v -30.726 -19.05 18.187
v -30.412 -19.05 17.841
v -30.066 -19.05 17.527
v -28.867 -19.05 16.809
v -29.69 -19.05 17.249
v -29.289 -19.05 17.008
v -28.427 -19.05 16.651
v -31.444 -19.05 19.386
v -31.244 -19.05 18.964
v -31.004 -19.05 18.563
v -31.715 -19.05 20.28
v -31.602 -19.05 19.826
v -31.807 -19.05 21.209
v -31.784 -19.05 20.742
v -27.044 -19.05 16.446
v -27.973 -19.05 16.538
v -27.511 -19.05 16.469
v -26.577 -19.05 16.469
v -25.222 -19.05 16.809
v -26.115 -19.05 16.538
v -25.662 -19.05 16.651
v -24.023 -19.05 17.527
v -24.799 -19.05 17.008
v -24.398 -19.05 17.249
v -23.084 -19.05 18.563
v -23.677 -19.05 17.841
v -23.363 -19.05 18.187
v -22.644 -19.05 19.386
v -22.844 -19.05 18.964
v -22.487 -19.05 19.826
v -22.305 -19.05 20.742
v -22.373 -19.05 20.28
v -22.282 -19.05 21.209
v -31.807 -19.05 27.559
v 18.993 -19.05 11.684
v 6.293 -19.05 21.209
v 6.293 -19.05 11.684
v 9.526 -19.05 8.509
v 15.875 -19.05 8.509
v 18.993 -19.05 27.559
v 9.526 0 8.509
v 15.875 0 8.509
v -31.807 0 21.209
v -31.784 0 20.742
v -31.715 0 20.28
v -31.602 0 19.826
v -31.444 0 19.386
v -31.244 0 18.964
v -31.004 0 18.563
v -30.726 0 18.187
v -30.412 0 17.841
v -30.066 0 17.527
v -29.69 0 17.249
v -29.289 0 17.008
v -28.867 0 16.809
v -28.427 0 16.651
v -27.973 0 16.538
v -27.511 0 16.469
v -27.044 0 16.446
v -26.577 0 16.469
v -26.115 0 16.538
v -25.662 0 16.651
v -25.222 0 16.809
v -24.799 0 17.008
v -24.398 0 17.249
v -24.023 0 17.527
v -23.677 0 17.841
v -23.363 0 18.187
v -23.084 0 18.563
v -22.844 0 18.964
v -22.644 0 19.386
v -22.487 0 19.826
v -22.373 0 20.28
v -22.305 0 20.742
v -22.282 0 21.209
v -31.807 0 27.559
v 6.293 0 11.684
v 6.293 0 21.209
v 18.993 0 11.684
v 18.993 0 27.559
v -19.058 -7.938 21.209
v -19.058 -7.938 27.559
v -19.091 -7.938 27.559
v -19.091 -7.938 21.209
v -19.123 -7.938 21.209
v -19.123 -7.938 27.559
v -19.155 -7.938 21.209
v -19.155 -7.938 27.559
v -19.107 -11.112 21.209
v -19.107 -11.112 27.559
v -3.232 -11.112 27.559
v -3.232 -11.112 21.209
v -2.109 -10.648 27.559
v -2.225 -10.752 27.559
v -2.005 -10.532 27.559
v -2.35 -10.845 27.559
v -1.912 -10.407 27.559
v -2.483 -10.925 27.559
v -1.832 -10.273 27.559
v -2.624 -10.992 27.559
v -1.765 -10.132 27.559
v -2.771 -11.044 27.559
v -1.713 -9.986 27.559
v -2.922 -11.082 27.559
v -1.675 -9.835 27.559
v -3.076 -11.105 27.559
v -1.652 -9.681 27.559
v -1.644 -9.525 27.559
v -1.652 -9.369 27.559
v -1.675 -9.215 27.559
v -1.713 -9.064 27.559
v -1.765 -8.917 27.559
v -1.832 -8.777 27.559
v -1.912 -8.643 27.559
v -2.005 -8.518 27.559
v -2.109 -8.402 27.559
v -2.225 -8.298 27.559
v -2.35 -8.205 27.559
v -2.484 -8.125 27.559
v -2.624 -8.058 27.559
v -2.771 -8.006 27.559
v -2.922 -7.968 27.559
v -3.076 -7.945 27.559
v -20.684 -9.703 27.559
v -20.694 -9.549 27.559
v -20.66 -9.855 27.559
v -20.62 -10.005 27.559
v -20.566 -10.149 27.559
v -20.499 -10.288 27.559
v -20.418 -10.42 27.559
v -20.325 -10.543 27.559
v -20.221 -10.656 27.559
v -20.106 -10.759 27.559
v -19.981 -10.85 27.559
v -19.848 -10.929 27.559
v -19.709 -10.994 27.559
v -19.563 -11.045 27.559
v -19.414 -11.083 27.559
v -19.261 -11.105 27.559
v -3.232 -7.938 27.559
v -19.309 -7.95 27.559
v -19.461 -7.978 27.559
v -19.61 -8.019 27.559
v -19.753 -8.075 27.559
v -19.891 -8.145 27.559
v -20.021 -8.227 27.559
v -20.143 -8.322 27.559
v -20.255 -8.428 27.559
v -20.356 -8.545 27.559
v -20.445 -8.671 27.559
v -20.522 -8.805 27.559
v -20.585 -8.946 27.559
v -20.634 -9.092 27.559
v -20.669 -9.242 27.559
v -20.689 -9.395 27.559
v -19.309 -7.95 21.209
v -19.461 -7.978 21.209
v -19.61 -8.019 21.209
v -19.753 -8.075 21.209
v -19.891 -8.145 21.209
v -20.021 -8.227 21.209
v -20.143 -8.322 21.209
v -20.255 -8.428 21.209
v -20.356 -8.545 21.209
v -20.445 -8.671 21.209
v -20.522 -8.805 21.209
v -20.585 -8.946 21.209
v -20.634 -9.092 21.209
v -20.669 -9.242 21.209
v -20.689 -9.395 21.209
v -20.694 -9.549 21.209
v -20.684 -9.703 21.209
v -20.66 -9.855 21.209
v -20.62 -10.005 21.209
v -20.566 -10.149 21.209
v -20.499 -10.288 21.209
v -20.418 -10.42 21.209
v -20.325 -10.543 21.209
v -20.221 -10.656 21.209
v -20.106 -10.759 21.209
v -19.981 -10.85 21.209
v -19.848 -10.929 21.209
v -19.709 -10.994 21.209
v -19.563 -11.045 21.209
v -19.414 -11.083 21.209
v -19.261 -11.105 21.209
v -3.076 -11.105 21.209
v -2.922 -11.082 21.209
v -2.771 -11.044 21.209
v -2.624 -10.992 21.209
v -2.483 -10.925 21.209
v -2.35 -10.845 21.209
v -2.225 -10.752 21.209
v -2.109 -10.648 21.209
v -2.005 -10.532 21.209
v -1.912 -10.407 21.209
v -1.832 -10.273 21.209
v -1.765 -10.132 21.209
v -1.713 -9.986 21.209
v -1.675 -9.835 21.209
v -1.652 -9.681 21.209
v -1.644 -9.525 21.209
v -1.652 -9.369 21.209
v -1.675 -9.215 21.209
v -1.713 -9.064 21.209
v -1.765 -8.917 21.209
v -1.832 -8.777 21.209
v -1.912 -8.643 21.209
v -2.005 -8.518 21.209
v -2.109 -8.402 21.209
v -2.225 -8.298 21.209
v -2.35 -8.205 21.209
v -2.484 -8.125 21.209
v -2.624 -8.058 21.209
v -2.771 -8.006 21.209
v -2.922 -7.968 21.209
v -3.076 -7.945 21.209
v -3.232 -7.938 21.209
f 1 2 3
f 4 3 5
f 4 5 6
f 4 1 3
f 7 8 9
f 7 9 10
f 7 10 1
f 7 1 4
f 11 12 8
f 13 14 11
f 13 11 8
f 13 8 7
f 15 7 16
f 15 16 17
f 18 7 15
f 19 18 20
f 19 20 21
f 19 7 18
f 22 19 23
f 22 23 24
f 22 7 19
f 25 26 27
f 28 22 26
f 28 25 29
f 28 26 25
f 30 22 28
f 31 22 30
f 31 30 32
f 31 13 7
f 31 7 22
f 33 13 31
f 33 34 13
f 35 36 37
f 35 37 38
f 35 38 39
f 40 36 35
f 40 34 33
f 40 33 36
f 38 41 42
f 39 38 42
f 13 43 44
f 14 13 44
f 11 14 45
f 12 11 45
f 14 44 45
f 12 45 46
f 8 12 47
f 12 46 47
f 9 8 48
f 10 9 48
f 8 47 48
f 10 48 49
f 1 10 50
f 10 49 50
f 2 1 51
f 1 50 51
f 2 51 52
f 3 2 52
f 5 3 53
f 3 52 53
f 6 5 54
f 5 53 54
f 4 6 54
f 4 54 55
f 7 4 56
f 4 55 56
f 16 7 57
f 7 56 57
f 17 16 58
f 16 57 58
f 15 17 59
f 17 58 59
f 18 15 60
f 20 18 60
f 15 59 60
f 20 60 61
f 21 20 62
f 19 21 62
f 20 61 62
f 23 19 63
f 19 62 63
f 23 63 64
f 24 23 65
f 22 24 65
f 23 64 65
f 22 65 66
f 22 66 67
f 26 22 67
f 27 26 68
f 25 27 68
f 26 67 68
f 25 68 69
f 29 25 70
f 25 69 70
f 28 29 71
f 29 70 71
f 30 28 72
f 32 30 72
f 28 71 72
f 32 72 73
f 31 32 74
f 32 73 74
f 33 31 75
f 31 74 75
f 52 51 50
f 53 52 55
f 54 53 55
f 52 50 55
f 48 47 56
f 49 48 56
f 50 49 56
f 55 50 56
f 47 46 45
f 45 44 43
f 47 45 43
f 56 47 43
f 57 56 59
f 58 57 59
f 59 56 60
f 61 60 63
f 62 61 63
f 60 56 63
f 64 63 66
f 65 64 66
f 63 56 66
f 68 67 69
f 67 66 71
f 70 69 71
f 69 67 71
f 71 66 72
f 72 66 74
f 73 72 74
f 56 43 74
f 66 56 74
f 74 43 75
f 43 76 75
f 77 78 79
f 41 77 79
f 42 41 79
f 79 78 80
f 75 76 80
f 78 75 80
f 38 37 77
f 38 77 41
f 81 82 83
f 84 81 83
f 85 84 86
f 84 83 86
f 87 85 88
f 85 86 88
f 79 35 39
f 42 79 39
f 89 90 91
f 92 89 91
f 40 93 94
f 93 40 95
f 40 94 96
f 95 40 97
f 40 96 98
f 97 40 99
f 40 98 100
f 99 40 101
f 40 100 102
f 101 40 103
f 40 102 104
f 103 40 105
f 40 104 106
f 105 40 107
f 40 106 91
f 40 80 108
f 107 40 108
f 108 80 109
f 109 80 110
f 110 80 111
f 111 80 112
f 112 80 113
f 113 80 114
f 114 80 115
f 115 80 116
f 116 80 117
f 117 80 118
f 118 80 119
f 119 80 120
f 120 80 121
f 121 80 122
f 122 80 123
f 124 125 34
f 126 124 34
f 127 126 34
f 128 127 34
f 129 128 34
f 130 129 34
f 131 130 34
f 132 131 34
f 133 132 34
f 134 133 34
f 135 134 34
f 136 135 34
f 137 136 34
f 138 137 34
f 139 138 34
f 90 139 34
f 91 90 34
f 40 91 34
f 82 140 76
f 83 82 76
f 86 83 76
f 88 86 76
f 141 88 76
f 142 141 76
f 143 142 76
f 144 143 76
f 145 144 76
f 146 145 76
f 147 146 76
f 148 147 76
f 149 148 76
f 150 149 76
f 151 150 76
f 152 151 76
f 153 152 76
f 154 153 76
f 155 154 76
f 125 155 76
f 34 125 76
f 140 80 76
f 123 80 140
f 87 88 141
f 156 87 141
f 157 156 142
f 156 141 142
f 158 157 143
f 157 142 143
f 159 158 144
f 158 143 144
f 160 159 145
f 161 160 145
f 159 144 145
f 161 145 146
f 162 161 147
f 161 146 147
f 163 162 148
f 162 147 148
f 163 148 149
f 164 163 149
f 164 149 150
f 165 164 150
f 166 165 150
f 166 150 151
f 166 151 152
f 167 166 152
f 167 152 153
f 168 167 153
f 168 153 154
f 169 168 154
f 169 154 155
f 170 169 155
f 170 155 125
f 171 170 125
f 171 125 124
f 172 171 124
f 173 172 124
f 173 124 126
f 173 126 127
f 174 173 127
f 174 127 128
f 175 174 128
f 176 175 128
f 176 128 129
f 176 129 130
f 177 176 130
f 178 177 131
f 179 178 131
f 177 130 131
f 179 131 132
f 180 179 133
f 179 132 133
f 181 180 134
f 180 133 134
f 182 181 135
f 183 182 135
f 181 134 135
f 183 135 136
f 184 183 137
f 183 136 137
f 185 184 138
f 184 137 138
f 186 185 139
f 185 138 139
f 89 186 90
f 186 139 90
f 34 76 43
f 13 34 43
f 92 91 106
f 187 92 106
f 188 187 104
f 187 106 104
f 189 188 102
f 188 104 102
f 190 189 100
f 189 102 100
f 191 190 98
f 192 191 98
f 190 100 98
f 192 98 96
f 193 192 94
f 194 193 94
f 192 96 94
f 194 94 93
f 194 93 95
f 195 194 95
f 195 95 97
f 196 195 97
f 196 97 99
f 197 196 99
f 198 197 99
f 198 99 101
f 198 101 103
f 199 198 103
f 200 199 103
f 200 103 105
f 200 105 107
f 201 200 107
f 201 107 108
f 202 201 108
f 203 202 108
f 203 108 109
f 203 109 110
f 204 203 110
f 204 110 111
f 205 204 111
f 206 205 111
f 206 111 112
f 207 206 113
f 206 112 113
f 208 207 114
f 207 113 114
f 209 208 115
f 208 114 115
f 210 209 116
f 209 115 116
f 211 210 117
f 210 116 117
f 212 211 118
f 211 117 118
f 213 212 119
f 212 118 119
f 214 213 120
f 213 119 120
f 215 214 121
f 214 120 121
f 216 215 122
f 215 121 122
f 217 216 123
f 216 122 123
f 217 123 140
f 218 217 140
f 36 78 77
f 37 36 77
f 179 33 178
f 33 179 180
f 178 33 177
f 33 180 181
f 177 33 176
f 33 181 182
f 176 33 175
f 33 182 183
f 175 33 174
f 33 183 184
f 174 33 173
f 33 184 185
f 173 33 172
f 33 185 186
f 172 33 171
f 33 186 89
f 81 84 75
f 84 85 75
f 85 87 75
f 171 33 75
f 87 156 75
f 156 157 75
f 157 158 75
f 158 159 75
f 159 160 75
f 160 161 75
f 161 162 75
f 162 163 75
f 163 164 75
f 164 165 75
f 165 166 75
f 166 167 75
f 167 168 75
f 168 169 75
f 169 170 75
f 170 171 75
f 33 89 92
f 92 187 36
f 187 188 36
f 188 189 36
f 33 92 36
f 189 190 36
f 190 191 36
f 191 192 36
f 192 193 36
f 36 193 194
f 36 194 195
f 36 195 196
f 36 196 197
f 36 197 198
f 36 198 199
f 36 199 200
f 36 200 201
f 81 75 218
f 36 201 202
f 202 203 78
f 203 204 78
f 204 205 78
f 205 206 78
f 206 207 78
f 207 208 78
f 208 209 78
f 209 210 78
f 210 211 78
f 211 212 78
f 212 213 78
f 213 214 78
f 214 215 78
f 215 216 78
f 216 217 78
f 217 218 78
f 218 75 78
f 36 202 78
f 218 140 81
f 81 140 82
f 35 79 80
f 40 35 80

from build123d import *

# Parameters (mm, degrees)
F1_DEPTH = 19.05
F3_DEPTH = 31.17521
F5_DEPTH = 22.95972
F7_DEPTH = 30.07307


with BuildPart() as f1:
    # F0 (on Front) → F1 (new body)
    with BuildSketch(Plane.XZ):
        with BuildLine():
            Line((18.993197, 27.558638), (-31.806803, 27.558638))
            Line((-31.806803, 27.558638), (-31.806803, 21.208638))
            ThreePointArc((-31.806803, 21.208638), (-27.044303, 16.446138), (-22.281803, 21.208638))
            Line((-22.281803, 21.208638), (6.293197, 21.208638))
            Line((6.293197, 21.208638), (6.293197, 8.508638))
            Line((6.293197, 8.508638), (18.993197, 8.508638))
            Line((18.993197, 8.508638), (18.993197, 27.558638))
        make_face()
    extrude(amount=F1_DEPTH)

    # F2 (on face) → F3 (cut)
    with BuildSketch(Plane.XY.offset(27.558638)):
        with BuildLine():
            Line((-19.155291, -7.938241), (-19.058462, -7.938236))
            ThreePointArc((-19.058462, -7.938236), (-19.106877, -7.9375), (-19.155291, -7.938241))
        make_face()
        with BuildLine():
            Line((-3.231877, -7.9375), (-19.058462, -7.938236))
            Line((-19.058462, -7.938236), (-19.155291, -7.938241))
            ThreePointArc((-19.155291, -7.938241), (-20.694118, -9.549247), (-19.106803, -11.1125))
            Line((-19.106803, -11.1125), (-3.231803, -11.1125))
            ThreePointArc((-3.231803, -11.1125), (-1.644303, -9.524963), (-3.231877, -7.9375))
        make_face()
    extrude(amount=-F3_DEPTH, mode=Mode.SUBTRACT)

    # F4 (on face) → F5 (cut)
    with BuildSketch(Plane(origin=(0, 0, 0), x_dir=(-1, 0, 0), z_dir=(0, 1, 0))):
        Polygon((-6.293197, 8.508638), (-6.293197, 11.683638), (-9.526091, 8.508638), align=None)
    extrude(amount=-F5_DEPTH, mode=Mode.SUBTRACT)

    # F6 (on face) → F7 (cut)
    with BuildSketch(Plane.XZ.offset(19.05)):
        Polygon((18.993197, 8.508638), (18.993197, 11.683638), (15.875054, 8.508638), align=None)
    extrude(amount=-F7_DEPTH, mode=Mode.SUBTRACT)


solid = f1.part
